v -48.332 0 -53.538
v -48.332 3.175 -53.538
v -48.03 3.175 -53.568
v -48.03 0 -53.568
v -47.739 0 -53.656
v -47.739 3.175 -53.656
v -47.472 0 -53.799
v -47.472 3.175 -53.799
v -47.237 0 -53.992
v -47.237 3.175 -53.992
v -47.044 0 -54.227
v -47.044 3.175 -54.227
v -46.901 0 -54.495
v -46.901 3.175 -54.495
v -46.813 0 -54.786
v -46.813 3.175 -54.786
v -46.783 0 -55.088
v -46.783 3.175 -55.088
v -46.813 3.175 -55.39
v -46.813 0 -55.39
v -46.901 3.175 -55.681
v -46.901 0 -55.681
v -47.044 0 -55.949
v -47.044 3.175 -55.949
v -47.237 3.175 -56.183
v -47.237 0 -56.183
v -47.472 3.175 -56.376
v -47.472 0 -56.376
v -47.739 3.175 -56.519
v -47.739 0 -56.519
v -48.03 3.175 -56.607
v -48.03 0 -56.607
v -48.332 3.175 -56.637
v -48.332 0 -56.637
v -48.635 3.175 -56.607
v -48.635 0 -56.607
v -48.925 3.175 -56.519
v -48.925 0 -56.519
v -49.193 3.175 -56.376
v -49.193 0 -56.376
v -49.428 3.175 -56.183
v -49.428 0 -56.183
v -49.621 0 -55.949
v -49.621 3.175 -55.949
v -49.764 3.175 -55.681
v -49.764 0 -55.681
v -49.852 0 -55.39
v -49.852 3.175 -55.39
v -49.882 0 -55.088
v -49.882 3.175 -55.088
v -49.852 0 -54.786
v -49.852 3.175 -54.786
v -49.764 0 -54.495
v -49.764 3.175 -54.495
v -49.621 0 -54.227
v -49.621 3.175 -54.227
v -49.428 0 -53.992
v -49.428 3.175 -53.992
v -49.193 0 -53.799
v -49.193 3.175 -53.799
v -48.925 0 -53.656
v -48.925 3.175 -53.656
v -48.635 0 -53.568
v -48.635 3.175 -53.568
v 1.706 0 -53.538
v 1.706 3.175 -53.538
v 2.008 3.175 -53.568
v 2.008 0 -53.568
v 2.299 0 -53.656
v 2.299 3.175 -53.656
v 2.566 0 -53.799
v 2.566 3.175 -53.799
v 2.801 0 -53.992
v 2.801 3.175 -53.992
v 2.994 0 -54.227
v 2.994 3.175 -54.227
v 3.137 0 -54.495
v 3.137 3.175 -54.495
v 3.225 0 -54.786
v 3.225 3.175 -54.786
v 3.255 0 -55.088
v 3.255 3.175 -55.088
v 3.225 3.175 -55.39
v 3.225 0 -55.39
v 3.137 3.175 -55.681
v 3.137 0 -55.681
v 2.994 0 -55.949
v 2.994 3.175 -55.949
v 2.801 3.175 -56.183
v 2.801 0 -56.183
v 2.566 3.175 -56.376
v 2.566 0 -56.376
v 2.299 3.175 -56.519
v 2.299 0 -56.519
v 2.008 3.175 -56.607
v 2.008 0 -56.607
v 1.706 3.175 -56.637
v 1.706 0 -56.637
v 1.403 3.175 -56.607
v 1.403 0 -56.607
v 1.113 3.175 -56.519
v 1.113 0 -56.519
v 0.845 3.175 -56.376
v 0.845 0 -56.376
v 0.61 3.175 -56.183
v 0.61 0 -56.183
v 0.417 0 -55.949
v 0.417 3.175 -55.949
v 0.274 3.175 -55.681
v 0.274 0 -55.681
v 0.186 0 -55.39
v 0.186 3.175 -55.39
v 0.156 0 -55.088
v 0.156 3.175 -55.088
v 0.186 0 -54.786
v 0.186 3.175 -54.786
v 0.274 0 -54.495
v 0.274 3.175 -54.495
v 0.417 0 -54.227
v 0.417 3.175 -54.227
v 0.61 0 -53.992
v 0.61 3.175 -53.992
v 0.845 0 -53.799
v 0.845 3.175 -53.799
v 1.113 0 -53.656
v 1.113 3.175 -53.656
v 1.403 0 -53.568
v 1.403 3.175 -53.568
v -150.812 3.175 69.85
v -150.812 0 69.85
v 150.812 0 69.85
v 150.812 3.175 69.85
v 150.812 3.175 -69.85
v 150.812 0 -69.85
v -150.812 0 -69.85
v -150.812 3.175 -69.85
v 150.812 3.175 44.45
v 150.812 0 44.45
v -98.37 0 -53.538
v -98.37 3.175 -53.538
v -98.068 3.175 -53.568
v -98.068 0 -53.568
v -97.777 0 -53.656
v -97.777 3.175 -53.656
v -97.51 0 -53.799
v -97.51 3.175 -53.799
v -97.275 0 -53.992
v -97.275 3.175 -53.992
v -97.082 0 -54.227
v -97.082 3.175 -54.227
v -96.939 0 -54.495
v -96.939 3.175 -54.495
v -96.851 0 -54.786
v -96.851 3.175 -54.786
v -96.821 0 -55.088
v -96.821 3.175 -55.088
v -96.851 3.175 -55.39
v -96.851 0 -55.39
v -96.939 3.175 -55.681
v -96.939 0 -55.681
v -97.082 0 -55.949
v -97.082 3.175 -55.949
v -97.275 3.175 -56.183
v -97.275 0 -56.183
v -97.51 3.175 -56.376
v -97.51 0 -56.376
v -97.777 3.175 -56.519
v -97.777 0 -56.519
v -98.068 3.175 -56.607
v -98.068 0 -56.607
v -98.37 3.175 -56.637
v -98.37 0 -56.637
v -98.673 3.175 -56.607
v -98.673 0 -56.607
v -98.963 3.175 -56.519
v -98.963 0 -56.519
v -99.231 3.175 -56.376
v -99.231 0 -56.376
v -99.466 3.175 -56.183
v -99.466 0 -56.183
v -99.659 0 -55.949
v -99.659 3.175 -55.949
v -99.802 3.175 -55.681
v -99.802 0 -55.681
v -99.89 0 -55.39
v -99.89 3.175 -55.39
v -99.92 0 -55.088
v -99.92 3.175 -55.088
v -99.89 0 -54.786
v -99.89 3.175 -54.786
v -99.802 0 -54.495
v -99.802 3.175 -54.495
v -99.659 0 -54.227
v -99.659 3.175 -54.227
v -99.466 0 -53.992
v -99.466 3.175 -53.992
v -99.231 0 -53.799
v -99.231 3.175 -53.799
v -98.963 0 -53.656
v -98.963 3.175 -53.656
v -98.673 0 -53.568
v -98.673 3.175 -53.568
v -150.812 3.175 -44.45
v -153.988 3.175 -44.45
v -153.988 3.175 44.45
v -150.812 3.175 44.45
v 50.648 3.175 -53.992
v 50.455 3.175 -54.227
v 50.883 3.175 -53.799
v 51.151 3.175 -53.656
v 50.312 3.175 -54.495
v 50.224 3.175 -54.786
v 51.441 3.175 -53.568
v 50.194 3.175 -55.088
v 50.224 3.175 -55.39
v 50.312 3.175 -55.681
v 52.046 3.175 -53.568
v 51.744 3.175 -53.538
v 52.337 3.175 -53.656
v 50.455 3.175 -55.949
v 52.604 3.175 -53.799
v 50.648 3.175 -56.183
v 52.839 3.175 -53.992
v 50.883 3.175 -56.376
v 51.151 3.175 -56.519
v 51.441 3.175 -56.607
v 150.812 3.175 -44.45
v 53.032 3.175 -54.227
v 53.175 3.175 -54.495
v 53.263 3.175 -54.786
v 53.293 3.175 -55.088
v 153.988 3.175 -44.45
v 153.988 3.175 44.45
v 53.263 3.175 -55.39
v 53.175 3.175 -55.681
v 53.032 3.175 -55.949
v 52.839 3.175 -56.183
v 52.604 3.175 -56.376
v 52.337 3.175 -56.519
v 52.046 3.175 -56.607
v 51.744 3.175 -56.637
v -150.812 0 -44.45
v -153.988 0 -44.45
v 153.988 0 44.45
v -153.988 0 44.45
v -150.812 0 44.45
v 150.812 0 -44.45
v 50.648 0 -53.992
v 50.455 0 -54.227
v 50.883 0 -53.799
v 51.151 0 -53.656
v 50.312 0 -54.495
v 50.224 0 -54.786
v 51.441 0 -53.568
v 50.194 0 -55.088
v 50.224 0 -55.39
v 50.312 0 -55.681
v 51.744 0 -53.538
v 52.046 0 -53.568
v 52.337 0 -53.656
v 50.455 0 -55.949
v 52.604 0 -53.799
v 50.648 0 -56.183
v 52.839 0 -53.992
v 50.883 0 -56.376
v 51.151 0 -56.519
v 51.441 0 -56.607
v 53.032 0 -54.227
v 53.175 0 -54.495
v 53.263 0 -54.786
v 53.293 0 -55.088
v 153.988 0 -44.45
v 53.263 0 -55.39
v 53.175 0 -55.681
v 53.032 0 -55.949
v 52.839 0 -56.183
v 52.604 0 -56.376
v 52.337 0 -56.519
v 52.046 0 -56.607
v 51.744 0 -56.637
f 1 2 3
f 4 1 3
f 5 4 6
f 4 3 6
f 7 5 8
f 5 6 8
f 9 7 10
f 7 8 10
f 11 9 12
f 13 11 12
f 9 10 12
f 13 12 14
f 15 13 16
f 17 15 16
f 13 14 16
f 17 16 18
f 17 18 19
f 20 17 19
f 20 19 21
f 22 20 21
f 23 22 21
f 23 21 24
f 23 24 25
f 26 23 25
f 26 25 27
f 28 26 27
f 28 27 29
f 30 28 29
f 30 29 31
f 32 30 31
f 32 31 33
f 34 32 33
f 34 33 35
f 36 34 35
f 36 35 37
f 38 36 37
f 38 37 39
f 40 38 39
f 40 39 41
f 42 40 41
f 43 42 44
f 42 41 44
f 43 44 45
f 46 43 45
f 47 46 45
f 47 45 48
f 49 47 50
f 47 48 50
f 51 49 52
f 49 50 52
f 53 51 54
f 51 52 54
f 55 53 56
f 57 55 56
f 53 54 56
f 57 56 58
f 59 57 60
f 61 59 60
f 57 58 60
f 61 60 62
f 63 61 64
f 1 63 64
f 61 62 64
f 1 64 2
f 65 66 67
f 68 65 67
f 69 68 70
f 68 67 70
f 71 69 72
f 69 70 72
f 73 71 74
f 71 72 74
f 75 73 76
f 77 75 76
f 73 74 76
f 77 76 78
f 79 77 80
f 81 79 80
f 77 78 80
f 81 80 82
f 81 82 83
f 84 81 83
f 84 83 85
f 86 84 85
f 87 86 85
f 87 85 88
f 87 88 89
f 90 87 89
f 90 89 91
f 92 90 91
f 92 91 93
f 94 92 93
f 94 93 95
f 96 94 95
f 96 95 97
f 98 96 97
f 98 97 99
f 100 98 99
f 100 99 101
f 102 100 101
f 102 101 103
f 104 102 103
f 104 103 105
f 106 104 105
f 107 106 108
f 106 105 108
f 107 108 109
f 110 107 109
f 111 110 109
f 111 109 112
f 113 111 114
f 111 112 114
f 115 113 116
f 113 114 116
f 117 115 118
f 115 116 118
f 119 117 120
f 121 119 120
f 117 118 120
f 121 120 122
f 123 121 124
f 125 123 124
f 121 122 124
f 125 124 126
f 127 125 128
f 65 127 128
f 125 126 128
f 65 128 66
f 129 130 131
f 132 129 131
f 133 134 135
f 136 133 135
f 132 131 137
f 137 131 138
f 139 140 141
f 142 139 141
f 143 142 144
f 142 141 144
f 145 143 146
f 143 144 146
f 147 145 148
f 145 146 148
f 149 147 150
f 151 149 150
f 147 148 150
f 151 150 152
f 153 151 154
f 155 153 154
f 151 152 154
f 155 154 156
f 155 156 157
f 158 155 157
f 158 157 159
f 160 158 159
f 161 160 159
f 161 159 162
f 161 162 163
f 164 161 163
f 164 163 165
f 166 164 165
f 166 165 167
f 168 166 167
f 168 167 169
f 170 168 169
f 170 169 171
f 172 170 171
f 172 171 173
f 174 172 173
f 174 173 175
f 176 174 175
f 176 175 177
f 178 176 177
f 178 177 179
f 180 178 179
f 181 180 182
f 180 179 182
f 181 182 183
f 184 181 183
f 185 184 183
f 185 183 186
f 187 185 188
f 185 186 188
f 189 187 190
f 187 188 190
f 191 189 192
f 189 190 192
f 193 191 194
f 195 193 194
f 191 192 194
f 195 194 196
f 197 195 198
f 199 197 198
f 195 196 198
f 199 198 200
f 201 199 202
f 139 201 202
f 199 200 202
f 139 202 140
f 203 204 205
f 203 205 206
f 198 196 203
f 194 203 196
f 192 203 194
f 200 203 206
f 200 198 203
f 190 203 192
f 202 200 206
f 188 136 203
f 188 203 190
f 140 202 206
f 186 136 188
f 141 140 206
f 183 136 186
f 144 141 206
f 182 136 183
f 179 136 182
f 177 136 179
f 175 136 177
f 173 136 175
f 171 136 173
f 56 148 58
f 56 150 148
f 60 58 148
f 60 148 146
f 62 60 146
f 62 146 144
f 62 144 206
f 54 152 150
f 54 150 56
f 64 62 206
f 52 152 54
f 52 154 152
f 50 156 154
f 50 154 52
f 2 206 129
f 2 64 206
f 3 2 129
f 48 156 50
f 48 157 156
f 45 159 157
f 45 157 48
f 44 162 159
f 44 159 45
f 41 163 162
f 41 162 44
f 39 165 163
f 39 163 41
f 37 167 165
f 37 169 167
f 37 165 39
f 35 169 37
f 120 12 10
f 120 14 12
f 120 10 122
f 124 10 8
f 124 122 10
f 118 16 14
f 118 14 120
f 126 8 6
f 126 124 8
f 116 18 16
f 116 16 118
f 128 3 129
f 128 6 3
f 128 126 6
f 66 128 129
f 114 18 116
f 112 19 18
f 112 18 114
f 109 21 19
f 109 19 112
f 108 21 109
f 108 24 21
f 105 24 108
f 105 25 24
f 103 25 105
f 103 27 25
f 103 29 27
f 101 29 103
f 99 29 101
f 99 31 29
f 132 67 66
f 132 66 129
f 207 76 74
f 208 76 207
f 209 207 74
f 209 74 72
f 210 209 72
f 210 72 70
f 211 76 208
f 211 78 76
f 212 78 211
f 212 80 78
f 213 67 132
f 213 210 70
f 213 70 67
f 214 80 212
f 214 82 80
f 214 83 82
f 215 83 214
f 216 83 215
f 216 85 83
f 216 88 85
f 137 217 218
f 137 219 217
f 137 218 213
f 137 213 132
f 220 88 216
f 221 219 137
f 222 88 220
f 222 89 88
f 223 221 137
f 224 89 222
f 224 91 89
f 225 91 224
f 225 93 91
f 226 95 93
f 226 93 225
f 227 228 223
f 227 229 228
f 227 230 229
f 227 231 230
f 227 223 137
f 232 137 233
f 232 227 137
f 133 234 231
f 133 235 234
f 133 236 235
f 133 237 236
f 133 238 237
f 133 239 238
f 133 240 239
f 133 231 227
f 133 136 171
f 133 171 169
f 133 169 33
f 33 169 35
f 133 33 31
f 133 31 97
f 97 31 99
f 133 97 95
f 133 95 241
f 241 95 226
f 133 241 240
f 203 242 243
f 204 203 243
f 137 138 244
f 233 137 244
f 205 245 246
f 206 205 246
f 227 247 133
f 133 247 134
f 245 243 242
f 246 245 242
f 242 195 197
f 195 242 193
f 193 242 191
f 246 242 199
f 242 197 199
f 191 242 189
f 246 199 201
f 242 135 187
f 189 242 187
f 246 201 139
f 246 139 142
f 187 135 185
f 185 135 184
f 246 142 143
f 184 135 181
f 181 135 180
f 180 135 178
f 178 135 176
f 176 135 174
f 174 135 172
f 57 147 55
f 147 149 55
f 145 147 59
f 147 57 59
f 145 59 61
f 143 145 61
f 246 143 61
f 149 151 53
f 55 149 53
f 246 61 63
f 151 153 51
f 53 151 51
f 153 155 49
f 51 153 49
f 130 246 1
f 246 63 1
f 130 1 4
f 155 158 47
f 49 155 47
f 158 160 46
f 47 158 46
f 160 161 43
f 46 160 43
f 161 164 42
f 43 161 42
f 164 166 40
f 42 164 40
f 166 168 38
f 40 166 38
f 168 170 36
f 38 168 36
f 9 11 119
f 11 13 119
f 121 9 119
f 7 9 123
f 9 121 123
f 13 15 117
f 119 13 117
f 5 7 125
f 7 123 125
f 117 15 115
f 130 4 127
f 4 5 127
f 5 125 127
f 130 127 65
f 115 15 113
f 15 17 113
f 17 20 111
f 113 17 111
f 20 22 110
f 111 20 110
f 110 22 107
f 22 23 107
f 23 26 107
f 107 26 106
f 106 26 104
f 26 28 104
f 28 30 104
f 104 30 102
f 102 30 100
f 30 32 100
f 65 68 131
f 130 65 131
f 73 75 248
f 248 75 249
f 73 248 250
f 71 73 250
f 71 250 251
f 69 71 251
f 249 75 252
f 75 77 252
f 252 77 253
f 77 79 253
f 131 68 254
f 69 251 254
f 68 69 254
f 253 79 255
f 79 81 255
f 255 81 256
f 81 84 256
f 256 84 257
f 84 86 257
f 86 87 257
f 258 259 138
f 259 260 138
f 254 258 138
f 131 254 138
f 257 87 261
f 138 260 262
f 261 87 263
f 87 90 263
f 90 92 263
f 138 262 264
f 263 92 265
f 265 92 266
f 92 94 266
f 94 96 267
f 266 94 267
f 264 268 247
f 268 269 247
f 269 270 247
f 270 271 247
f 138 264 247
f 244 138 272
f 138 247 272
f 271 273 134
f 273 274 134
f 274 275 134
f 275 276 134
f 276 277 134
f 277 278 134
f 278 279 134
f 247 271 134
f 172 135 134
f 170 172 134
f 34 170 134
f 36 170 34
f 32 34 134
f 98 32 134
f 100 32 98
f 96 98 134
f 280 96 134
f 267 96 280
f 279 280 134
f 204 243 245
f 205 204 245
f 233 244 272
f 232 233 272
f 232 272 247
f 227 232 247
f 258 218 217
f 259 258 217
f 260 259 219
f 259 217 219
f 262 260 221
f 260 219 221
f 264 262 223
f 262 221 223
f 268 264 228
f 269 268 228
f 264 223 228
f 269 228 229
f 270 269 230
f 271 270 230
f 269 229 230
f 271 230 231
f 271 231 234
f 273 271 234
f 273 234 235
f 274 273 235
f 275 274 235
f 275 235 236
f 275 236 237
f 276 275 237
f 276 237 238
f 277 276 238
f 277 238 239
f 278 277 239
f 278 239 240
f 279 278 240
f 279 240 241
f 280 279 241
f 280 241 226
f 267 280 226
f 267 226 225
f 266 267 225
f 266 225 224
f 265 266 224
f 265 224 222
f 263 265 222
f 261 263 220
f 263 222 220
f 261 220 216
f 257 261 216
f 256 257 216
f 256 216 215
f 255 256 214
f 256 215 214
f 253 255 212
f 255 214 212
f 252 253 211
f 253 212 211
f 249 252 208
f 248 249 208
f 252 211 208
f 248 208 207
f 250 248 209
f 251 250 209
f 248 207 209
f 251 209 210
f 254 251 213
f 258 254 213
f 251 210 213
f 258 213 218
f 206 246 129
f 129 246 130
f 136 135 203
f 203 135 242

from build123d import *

# Parameters (mm, degrees)
BOSS_EXTRUDE1_DEPTH = 3.175
SKETCH3_R           = 1.5494
CUT_EXTRUDE1_DEPTH  = 170.119050616


with BuildPart() as part:
    # Sketch1 → Boss-Extrude1 (new body)
    with BuildSketch(Plane(origin=(0, 0, 0), x_dir=(1, 0, 0), z_dir=(0, 1, 0))):
        Polygon((-150.8125, 44.45), (-153.9875, 44.45), (-153.9875, -44.45), (-150.8125, -44.45), (-150.8125, -69.85), (150.8125, -69.85), (150.8125, -44.45), (153.9875, -44.45), (153.9875, 44.45), (150.8125, 44.45), (150.8125, 69.85), (-150.8125, 69.85), align=None)
    extrude(amount=BOSS_EXTRUDE1_DEPTH)

    # Sketch3 → Cut-Extrude1 (cut, through all)
    with BuildSketch(Plane(origin=(0, 3.175, 0), x_dir=(1, 0, 0), z_dir=(0, 1, 0))):
        with Locations(Location((-98.37039, 55.087774, 0), (0, 0, 270))):
            Circle(SKETCH3_R)
        with Locations(Location((-48.33239, 55.087774, 0), (0, 0, 270))):
            Circle(SKETCH3_R)
        with Locations(Location((1.70561, 55.087774, 0), (0, 0, 270))):
            Circle(SKETCH3_R)
        with Locations(Location((51.74361, 55.087774, 0), (0, 0, 270))):
            Circle(SKETCH3_R)
    extrude(amount=-CUT_EXTRUDE1_DEPTH, mode=Mode.SUBTRACT)


solid = part.part
